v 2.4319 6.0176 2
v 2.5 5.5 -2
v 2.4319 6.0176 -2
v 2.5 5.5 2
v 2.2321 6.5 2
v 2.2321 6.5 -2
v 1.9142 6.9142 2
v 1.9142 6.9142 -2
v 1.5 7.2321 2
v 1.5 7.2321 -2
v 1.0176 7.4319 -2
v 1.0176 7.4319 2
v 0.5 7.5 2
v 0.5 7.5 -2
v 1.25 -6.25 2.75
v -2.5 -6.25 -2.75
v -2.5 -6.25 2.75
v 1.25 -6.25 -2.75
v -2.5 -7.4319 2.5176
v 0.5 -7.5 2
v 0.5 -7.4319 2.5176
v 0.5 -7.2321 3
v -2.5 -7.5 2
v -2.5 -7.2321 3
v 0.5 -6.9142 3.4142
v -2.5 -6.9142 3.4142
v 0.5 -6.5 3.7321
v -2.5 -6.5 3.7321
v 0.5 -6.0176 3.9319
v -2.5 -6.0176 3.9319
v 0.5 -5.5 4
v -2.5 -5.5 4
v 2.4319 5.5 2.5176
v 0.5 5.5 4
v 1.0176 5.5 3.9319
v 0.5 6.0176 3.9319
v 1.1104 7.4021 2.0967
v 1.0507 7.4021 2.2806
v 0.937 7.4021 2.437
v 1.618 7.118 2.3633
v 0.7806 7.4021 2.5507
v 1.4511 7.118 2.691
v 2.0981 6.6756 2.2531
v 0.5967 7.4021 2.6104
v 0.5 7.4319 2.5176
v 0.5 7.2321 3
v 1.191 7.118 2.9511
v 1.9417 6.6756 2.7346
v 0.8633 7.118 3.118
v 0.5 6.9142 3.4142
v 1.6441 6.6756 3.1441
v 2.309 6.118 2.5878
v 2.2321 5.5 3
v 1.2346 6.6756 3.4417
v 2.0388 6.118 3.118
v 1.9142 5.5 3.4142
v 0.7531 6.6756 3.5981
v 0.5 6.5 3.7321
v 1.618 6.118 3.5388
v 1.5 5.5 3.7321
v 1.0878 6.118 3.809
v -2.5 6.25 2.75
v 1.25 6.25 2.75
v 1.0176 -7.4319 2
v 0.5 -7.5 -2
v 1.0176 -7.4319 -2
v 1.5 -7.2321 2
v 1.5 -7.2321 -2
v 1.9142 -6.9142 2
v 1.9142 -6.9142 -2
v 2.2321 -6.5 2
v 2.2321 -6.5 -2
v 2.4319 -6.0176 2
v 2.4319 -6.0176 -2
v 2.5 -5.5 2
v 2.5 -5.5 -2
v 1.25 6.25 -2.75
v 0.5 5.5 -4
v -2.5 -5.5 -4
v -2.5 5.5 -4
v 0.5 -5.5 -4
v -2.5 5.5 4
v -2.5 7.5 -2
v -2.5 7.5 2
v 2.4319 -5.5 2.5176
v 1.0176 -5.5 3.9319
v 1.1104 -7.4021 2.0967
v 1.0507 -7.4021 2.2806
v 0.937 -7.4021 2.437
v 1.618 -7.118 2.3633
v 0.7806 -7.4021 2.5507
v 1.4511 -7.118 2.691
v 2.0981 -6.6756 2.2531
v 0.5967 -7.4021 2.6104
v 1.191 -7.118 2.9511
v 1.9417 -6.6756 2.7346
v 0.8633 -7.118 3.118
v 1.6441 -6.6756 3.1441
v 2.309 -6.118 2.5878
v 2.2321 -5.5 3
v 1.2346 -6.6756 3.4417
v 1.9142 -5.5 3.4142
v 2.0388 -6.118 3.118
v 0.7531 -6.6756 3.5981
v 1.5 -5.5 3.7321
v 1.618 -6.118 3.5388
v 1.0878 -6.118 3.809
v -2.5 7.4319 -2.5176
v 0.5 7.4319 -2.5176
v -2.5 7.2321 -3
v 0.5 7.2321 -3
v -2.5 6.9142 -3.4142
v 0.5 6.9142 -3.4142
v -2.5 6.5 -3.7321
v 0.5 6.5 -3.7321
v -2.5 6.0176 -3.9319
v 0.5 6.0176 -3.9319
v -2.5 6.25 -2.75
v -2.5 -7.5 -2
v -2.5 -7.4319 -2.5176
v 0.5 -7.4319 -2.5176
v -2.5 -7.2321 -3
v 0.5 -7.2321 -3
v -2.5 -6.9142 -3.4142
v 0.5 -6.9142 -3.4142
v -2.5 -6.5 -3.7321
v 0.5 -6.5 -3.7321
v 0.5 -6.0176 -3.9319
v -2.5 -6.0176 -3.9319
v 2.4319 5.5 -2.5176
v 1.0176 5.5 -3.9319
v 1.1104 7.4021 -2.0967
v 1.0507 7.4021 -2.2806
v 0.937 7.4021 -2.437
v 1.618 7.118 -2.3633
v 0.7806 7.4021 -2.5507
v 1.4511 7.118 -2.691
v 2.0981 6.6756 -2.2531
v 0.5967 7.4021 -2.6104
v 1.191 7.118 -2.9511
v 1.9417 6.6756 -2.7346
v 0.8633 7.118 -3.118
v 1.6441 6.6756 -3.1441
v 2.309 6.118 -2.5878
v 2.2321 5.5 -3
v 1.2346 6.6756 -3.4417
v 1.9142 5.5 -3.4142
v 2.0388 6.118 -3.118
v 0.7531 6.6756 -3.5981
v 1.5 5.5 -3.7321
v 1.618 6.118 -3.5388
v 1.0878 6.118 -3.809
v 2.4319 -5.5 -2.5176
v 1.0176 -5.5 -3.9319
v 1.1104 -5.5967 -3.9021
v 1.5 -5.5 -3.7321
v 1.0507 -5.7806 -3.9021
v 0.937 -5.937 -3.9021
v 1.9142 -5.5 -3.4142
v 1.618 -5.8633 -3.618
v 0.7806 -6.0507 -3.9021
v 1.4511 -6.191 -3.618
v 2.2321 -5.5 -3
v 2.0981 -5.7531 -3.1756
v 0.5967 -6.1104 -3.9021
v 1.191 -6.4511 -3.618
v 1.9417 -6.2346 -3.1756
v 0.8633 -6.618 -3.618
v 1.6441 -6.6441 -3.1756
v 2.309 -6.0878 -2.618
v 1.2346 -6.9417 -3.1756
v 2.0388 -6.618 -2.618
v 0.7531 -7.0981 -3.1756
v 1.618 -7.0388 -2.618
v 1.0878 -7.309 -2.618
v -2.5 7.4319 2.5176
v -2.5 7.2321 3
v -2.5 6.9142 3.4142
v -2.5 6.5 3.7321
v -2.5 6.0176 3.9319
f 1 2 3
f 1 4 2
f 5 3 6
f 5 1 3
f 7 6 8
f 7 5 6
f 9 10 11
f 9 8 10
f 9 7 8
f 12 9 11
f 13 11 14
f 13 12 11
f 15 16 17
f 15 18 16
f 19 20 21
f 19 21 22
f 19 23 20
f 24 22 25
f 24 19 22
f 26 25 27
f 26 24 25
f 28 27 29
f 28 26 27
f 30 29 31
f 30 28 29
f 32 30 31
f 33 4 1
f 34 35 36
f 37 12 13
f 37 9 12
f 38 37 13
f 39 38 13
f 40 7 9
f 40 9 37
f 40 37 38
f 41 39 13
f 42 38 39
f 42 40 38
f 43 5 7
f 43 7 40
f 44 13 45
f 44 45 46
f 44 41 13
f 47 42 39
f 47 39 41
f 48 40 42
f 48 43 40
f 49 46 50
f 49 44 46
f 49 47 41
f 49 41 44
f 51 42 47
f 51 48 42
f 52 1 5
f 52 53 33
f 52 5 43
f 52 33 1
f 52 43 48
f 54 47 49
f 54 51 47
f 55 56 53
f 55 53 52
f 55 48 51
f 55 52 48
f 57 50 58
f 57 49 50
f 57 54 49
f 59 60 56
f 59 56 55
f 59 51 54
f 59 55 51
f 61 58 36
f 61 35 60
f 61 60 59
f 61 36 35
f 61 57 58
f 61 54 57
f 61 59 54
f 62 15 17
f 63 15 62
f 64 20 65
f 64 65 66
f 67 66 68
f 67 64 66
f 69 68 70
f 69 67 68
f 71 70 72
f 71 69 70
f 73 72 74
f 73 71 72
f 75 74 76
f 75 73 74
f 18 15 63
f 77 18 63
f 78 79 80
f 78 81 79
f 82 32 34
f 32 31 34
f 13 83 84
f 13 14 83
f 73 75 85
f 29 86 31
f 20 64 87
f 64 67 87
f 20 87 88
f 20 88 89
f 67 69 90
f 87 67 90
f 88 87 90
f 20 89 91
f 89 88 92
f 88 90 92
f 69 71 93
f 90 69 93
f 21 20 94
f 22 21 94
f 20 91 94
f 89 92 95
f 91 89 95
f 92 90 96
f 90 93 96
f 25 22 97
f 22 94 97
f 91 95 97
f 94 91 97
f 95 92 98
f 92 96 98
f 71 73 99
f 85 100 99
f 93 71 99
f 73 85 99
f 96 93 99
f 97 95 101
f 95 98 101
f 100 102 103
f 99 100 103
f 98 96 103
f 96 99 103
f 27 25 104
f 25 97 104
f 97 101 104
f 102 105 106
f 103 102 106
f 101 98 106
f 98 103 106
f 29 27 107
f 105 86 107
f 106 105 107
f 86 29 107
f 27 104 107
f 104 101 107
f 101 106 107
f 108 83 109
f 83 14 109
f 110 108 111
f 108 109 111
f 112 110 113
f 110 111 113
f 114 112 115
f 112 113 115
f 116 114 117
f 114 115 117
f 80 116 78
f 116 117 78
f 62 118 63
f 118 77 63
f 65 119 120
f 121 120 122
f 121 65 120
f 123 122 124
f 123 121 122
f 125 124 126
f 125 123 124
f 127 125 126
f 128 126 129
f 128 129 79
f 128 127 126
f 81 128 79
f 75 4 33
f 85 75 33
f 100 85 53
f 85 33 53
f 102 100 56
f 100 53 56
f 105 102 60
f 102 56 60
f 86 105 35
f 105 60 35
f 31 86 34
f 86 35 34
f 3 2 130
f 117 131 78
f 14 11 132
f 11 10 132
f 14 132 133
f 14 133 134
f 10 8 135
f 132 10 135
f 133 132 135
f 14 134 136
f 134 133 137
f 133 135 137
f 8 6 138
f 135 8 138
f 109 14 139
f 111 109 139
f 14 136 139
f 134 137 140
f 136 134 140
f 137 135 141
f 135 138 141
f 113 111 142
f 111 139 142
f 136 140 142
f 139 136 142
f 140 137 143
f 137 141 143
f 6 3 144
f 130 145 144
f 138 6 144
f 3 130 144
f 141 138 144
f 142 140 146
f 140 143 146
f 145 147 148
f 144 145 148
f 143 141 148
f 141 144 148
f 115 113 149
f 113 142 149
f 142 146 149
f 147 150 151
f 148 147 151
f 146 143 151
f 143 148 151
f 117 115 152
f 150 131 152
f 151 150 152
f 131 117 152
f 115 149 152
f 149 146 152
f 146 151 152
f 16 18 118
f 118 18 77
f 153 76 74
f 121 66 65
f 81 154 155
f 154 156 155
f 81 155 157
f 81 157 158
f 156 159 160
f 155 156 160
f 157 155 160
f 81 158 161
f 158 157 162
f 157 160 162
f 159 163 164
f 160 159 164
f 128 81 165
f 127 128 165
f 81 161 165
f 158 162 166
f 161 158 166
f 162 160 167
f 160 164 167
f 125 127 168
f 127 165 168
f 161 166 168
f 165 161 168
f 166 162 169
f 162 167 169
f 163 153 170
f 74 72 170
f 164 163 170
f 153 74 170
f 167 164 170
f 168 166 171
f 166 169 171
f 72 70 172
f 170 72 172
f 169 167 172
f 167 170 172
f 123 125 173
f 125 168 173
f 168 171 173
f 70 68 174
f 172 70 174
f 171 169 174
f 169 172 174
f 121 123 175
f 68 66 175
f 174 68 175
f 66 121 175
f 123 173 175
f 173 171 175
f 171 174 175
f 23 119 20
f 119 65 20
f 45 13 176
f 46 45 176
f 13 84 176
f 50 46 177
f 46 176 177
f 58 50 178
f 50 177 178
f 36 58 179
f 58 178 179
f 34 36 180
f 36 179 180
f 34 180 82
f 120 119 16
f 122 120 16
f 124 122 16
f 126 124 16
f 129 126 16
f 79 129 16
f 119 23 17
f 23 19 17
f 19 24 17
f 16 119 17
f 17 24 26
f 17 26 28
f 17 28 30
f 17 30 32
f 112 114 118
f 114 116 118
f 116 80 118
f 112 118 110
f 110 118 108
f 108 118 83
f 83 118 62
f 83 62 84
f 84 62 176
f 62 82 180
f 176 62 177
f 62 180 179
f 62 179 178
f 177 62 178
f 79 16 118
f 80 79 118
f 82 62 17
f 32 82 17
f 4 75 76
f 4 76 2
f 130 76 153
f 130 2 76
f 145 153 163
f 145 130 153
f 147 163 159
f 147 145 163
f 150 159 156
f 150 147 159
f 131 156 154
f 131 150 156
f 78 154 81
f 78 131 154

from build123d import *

# Parameters (mm, degrees)
F0_W     = 15
F0_H     = 8
F1_DEPTH = 2.5
F2_T     = -1.25
F3_R     = 2


# Not quite as in the source:
# - a feature names something its author has since deleted; it is built from what else it names


with BuildPart() as f1:
    # F0 (on Right) → F1 (new body, symmetric)
    with BuildSketch(Plane.YZ):
        Rectangle(F0_W, F0_H)
    extrude(amount=F1_DEPTH, both=True)

    # F2
    f2_openings = [f1.faces().sort_by_distance(p)[0] for p in [
        (-2.5, 0, 0),
    ]]
    offset(amount=F2_T, openings=f2_openings)

    # F3
    f3_edges = [f1.edges().sort_by_distance(p)[0] for p in [
        (2.5, 0, 4),
        (2.5, -7.5, 0),
        (2.5, 0, -4),
        (2.5, 7.5, 0),
        (0, -7.5, 4),
        (0, 7.5, 4),
        (0, 7.5, -4),
        (0, -7.5, -4),
    ]]
    fillet(f3_edges, radius=F3_R)


solid = f1.part
